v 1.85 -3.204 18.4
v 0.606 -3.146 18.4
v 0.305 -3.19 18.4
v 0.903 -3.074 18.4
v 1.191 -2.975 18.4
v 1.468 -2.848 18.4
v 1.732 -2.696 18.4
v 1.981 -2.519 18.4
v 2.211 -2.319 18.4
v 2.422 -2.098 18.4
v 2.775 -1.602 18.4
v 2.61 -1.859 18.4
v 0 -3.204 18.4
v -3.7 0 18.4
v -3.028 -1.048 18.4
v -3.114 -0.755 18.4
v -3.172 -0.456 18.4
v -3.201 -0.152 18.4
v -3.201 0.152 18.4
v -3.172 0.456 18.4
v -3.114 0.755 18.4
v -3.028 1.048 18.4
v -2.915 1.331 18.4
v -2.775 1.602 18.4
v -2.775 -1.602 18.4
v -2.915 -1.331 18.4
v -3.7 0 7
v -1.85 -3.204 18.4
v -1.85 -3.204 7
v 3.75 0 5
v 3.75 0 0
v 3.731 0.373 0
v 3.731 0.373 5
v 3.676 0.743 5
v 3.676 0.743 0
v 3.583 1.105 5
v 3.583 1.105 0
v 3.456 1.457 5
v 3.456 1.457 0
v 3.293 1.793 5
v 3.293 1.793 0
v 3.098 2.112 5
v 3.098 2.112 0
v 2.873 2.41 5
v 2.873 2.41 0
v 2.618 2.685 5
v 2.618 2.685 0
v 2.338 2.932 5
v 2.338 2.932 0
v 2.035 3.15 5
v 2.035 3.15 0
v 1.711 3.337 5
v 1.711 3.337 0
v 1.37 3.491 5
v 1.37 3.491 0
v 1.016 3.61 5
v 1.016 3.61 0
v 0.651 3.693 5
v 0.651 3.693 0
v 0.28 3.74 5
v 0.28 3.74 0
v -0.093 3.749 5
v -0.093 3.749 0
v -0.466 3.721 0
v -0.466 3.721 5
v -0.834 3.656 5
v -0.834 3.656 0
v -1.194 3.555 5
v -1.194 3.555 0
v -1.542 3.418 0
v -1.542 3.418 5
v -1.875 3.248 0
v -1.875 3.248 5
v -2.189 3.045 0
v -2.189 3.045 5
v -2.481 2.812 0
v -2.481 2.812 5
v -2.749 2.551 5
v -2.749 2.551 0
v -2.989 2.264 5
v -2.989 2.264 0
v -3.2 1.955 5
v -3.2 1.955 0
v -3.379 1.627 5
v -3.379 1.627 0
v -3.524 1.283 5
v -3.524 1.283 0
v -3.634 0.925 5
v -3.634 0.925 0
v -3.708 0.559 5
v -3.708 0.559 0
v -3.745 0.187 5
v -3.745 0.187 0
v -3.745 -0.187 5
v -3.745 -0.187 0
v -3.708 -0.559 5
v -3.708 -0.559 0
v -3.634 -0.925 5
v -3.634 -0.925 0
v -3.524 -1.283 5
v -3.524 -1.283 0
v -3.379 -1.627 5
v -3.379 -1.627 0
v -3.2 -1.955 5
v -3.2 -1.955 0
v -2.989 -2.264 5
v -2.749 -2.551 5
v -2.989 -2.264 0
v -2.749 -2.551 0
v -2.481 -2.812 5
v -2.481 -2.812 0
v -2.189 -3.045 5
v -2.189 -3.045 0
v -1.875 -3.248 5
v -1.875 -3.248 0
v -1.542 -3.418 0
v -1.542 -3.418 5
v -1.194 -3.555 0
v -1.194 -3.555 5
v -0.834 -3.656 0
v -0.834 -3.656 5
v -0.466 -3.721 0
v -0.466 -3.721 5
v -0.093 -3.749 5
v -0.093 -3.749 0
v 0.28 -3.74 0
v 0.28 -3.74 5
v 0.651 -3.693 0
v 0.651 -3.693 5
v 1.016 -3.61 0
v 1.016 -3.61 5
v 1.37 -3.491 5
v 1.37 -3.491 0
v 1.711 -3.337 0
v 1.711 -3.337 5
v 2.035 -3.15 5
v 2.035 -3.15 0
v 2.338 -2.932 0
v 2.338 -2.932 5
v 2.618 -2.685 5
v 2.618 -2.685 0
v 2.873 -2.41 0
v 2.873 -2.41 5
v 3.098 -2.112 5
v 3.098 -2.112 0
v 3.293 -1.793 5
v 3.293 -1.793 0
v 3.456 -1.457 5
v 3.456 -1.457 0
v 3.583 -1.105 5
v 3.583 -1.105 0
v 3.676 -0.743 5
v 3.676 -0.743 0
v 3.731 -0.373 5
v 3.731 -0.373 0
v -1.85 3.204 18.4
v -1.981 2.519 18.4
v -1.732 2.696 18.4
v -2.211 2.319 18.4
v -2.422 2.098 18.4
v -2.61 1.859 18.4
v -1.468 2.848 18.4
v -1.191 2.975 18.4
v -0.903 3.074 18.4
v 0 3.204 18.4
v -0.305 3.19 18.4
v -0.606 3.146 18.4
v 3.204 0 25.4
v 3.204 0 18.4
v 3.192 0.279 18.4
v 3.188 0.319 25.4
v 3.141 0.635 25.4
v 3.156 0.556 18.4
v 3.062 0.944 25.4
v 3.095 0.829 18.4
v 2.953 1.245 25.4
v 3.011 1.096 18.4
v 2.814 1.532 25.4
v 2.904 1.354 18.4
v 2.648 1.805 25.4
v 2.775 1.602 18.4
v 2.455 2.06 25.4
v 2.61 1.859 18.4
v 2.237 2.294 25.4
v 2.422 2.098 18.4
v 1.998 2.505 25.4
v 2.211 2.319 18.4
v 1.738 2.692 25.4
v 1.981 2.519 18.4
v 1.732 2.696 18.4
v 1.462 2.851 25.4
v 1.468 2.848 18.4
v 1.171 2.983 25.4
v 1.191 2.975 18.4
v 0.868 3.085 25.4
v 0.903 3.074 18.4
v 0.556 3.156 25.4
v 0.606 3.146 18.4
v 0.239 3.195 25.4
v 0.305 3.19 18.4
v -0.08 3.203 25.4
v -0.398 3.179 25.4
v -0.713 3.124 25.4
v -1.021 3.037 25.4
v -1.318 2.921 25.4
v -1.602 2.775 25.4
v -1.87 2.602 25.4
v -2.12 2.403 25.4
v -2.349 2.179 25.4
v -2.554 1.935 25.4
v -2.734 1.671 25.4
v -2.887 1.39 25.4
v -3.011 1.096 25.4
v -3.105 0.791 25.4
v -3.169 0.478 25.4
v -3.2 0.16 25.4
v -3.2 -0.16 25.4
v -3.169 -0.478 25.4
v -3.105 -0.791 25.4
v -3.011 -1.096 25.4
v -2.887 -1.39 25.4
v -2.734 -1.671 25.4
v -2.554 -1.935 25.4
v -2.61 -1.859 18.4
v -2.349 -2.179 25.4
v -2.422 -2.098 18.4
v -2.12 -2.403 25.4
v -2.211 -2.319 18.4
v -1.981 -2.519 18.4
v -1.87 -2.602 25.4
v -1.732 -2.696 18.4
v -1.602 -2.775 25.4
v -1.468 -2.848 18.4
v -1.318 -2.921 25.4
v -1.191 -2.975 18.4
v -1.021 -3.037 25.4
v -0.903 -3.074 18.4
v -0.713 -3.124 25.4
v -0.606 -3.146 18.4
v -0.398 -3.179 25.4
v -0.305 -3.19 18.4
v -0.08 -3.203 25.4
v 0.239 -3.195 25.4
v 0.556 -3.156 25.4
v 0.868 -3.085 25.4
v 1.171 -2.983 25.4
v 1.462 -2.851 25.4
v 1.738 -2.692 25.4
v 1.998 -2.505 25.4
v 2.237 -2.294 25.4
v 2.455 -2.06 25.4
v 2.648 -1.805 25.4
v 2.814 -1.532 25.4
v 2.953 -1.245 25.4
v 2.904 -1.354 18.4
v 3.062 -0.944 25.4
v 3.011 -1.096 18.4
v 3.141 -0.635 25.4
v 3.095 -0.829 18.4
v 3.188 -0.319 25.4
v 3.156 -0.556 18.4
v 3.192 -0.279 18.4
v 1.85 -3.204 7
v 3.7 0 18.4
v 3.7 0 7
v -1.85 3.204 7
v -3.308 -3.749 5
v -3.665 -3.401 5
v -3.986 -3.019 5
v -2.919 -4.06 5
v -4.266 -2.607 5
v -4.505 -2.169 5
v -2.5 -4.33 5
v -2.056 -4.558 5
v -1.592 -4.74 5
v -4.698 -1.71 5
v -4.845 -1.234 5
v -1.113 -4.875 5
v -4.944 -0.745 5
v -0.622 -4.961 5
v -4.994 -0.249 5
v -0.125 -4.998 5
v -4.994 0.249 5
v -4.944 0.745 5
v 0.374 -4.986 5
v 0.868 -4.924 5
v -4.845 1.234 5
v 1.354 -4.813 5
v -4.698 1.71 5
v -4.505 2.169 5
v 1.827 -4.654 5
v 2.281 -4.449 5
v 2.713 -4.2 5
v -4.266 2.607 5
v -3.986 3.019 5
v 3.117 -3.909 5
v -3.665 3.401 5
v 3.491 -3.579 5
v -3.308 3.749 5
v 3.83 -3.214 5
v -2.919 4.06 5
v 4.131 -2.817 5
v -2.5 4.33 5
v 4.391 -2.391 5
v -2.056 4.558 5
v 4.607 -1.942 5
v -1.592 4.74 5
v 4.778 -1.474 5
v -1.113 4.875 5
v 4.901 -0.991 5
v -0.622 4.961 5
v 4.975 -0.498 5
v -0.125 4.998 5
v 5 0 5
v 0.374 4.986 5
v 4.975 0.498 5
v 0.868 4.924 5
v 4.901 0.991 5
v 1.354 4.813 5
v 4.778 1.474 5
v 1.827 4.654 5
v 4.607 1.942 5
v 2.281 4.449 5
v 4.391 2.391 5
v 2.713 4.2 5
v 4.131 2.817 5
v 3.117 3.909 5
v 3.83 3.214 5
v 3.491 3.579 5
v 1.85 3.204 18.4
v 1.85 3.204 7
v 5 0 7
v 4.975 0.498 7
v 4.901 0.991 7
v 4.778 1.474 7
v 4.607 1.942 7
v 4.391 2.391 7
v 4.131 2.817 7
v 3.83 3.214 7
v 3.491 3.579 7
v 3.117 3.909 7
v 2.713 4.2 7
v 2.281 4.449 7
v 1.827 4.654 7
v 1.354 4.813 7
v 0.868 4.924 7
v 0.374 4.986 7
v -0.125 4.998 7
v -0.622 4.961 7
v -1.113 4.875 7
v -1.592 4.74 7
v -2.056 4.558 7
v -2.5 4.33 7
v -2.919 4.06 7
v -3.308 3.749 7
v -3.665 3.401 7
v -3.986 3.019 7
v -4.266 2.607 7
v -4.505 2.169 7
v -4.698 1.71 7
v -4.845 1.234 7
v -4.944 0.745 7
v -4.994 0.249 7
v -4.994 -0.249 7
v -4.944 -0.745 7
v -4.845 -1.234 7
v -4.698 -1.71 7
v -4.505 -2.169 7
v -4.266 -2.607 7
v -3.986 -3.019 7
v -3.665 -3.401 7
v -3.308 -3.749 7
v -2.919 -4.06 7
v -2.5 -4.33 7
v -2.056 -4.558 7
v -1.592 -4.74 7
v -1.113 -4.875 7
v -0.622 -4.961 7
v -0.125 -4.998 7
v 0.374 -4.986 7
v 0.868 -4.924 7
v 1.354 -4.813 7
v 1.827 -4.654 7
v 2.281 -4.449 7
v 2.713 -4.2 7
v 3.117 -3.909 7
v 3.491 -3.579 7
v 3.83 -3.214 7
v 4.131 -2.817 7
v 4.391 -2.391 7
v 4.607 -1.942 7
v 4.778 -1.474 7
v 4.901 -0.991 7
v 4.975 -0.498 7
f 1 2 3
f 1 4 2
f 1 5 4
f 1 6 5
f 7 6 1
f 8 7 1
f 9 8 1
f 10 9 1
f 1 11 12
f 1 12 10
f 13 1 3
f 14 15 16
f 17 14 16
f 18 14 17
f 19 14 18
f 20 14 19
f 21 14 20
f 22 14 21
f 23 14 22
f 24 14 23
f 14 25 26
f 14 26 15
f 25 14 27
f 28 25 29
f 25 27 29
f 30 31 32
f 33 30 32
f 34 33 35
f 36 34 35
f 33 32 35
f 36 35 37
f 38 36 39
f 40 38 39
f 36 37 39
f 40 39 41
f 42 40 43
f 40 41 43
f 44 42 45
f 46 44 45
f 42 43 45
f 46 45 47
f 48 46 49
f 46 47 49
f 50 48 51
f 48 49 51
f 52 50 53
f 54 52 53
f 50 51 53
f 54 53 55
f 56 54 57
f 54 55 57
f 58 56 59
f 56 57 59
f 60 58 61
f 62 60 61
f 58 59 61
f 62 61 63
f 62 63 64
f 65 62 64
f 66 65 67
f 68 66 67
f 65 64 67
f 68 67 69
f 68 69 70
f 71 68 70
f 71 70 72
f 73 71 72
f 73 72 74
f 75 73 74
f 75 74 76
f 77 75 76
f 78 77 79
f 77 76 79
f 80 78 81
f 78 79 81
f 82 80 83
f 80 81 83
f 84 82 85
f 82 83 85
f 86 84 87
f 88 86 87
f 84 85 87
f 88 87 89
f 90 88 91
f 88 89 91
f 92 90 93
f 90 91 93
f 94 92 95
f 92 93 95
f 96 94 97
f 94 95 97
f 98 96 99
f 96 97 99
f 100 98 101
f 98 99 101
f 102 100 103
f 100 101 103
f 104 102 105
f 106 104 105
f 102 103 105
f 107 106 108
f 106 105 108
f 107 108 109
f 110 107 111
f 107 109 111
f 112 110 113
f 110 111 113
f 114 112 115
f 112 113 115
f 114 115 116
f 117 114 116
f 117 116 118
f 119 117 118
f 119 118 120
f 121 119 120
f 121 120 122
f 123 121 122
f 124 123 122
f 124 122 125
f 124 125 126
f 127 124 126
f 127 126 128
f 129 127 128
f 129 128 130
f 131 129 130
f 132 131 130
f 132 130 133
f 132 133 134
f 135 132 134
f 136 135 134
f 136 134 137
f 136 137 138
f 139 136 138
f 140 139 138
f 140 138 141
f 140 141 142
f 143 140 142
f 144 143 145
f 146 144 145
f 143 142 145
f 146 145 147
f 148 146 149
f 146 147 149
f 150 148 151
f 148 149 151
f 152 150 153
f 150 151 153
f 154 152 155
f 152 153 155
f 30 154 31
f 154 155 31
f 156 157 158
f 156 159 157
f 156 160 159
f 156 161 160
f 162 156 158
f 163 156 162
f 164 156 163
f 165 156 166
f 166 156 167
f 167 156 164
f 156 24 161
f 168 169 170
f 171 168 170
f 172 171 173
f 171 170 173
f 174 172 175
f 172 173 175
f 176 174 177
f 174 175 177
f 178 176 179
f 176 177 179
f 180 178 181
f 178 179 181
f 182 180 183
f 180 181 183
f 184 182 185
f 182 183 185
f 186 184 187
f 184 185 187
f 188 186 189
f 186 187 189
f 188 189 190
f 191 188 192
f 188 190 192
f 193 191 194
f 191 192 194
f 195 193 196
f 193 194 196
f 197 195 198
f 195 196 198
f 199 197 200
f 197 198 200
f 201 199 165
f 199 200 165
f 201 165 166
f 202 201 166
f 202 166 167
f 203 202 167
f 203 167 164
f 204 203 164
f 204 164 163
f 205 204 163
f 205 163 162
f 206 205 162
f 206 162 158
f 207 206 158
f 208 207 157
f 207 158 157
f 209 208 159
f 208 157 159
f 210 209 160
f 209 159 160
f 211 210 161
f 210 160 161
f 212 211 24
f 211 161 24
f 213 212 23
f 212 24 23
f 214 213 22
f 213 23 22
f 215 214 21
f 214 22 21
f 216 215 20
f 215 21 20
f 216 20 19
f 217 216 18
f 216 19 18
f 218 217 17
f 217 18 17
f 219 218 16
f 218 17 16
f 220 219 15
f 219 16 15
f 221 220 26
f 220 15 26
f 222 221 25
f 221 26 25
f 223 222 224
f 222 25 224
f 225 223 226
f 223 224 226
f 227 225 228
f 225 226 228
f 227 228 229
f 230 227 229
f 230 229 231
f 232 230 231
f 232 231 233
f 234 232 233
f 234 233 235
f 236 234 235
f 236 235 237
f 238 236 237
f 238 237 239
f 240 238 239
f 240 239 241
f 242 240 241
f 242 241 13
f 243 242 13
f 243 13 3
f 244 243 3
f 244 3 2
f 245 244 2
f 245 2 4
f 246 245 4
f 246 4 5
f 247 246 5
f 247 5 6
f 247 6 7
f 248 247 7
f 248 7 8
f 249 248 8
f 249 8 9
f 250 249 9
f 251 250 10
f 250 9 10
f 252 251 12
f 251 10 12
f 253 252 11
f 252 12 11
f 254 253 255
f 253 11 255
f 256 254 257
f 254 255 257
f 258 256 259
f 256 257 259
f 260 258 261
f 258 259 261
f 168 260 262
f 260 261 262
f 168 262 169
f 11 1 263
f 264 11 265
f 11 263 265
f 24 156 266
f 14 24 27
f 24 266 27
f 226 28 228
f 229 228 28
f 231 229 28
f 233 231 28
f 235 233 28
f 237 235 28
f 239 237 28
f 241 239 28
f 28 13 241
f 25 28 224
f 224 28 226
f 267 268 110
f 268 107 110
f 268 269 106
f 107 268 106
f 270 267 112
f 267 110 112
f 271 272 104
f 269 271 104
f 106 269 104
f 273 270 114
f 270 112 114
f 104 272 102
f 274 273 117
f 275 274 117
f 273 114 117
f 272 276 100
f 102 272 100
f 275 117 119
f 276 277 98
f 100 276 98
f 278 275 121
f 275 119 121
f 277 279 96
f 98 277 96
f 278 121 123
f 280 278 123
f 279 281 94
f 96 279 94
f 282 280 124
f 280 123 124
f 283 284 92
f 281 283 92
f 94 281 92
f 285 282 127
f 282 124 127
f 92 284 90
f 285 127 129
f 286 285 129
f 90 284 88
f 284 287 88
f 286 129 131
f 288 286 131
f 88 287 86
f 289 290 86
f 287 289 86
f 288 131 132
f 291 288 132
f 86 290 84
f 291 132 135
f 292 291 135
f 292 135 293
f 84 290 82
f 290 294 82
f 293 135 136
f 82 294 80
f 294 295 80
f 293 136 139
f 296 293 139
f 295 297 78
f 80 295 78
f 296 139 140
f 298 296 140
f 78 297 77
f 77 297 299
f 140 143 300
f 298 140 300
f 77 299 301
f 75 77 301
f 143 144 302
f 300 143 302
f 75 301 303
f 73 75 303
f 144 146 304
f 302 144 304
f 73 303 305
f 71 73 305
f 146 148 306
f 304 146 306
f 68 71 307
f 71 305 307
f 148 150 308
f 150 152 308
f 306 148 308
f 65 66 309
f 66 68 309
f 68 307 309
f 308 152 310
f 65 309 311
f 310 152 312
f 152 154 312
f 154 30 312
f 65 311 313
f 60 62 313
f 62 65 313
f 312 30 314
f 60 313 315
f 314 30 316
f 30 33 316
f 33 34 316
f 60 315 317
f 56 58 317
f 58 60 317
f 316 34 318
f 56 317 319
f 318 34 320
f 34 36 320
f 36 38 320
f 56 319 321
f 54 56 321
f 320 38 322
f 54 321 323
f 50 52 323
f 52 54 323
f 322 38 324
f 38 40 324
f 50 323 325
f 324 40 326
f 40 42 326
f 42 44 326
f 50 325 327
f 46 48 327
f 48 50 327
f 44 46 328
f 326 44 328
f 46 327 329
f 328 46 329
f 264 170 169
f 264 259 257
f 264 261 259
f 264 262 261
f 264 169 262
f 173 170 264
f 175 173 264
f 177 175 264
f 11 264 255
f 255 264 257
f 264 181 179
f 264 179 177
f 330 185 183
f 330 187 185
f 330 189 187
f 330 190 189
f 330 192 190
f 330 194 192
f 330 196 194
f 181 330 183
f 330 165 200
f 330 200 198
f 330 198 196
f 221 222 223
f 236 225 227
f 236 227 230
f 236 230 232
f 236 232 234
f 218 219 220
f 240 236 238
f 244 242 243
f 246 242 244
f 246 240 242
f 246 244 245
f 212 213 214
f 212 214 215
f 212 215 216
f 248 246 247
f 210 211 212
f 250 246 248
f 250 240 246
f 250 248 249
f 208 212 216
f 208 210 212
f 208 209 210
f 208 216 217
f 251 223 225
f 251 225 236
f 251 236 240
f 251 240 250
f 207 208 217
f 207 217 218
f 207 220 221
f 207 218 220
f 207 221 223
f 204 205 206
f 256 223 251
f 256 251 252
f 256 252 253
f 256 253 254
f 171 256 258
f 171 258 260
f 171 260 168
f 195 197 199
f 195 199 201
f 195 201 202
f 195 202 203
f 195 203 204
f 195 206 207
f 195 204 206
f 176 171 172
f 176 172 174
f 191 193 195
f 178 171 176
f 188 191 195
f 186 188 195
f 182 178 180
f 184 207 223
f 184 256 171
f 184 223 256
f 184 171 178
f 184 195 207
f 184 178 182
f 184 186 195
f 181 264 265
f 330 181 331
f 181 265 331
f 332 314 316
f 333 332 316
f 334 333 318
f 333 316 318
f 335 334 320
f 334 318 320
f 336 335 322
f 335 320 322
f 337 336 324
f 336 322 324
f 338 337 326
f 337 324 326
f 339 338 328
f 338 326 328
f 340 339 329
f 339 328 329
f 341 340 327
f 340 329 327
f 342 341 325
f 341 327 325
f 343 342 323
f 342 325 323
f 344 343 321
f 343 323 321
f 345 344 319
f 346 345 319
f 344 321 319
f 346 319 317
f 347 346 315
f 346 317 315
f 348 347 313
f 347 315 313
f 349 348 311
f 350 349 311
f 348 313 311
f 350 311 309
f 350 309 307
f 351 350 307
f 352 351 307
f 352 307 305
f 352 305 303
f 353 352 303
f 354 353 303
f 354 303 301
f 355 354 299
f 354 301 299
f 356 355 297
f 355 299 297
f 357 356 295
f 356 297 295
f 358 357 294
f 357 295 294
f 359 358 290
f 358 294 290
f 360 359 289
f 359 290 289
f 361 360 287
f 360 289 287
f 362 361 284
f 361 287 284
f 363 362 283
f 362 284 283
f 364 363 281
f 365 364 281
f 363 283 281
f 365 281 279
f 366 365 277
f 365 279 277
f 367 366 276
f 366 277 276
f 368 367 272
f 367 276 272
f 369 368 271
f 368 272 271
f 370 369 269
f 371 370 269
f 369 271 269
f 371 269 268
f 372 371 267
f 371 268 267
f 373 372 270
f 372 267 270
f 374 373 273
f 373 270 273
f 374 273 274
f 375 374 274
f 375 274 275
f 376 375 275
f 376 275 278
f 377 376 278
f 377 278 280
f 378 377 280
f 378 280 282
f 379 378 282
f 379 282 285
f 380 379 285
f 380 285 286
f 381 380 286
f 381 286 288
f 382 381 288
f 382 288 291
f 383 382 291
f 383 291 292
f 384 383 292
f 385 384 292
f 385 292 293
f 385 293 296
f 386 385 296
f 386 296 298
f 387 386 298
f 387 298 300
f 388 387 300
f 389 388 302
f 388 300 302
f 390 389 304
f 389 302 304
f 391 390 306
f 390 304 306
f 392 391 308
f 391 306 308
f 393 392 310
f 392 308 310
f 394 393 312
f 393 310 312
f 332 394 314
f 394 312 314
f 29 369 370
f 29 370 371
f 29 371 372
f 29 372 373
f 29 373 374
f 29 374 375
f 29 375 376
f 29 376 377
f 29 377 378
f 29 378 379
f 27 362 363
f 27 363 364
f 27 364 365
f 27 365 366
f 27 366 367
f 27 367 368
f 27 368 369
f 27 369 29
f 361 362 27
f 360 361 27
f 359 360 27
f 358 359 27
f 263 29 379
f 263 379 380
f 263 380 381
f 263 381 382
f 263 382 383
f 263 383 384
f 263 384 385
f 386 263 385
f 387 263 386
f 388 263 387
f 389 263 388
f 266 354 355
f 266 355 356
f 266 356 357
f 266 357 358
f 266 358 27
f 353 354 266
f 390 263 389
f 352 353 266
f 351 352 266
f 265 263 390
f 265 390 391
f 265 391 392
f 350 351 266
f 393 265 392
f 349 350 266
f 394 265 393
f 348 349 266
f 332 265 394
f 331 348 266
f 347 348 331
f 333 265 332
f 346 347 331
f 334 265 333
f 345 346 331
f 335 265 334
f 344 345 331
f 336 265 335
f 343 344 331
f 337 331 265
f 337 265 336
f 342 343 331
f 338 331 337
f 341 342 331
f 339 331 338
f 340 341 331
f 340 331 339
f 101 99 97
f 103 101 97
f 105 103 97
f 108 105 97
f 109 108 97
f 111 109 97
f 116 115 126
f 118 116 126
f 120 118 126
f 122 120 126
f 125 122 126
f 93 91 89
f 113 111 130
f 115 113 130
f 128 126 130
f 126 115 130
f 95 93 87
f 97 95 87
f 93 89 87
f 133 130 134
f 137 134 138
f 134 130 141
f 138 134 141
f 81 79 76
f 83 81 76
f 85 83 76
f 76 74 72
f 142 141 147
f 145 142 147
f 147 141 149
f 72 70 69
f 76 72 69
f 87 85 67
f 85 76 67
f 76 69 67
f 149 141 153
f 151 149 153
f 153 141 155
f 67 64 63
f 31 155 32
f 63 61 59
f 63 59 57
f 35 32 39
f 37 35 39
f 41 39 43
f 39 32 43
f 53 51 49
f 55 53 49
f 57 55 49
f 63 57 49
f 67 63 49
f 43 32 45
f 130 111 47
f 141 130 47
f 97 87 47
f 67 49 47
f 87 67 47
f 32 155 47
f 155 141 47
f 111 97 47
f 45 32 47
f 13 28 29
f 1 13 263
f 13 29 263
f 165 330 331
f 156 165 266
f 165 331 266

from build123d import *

# Parameters (mm, degrees)
SKETCH1_R           = 3.75
BOSS_EXTRUDE1_DEPTH = 5
SKETCH2_R           = 5
BOSS_EXTRUDE2_DEPTH = 2
BOSS_EXTRUDE3_DEPTH = 11.4
SKETCH4_R           = 3.204293994
BOSS_EXTRUDE4_DEPTH = 7


with BuildPart() as part:
    # Sketch1 → Boss-Extrude1 (new body)
    with BuildSketch(Plane.XY):
        Circle(SKETCH1_R)
    extrude(amount=BOSS_EXTRUDE1_DEPTH)

    # Sketch2 → Boss-Extrude2 (add)
    with BuildSketch(Plane.XY.offset(5)):
        Circle(SKETCH2_R)
    extrude(amount=BOSS_EXTRUDE2_DEPTH)

    # Sketch3 → Boss-Extrude3 (add)
    with BuildSketch(Plane.XY.offset(7)):
        Polygon((3.7, 0), (1.85, 3.204293994), (-1.85, 3.204293994), (-3.7, 0), (-1.85, -3.204293994), (1.85, -3.204293994), align=None)
    extrude(amount=BOSS_EXTRUDE3_DEPTH)

    # Sketch4 → Boss-Extrude4 (add)
    with BuildSketch(Plane.XY.offset(18.4)):
        Circle(SKETCH4_R)
    extrude(amount=BOSS_EXTRUDE4_DEPTH)


solid = part.part
